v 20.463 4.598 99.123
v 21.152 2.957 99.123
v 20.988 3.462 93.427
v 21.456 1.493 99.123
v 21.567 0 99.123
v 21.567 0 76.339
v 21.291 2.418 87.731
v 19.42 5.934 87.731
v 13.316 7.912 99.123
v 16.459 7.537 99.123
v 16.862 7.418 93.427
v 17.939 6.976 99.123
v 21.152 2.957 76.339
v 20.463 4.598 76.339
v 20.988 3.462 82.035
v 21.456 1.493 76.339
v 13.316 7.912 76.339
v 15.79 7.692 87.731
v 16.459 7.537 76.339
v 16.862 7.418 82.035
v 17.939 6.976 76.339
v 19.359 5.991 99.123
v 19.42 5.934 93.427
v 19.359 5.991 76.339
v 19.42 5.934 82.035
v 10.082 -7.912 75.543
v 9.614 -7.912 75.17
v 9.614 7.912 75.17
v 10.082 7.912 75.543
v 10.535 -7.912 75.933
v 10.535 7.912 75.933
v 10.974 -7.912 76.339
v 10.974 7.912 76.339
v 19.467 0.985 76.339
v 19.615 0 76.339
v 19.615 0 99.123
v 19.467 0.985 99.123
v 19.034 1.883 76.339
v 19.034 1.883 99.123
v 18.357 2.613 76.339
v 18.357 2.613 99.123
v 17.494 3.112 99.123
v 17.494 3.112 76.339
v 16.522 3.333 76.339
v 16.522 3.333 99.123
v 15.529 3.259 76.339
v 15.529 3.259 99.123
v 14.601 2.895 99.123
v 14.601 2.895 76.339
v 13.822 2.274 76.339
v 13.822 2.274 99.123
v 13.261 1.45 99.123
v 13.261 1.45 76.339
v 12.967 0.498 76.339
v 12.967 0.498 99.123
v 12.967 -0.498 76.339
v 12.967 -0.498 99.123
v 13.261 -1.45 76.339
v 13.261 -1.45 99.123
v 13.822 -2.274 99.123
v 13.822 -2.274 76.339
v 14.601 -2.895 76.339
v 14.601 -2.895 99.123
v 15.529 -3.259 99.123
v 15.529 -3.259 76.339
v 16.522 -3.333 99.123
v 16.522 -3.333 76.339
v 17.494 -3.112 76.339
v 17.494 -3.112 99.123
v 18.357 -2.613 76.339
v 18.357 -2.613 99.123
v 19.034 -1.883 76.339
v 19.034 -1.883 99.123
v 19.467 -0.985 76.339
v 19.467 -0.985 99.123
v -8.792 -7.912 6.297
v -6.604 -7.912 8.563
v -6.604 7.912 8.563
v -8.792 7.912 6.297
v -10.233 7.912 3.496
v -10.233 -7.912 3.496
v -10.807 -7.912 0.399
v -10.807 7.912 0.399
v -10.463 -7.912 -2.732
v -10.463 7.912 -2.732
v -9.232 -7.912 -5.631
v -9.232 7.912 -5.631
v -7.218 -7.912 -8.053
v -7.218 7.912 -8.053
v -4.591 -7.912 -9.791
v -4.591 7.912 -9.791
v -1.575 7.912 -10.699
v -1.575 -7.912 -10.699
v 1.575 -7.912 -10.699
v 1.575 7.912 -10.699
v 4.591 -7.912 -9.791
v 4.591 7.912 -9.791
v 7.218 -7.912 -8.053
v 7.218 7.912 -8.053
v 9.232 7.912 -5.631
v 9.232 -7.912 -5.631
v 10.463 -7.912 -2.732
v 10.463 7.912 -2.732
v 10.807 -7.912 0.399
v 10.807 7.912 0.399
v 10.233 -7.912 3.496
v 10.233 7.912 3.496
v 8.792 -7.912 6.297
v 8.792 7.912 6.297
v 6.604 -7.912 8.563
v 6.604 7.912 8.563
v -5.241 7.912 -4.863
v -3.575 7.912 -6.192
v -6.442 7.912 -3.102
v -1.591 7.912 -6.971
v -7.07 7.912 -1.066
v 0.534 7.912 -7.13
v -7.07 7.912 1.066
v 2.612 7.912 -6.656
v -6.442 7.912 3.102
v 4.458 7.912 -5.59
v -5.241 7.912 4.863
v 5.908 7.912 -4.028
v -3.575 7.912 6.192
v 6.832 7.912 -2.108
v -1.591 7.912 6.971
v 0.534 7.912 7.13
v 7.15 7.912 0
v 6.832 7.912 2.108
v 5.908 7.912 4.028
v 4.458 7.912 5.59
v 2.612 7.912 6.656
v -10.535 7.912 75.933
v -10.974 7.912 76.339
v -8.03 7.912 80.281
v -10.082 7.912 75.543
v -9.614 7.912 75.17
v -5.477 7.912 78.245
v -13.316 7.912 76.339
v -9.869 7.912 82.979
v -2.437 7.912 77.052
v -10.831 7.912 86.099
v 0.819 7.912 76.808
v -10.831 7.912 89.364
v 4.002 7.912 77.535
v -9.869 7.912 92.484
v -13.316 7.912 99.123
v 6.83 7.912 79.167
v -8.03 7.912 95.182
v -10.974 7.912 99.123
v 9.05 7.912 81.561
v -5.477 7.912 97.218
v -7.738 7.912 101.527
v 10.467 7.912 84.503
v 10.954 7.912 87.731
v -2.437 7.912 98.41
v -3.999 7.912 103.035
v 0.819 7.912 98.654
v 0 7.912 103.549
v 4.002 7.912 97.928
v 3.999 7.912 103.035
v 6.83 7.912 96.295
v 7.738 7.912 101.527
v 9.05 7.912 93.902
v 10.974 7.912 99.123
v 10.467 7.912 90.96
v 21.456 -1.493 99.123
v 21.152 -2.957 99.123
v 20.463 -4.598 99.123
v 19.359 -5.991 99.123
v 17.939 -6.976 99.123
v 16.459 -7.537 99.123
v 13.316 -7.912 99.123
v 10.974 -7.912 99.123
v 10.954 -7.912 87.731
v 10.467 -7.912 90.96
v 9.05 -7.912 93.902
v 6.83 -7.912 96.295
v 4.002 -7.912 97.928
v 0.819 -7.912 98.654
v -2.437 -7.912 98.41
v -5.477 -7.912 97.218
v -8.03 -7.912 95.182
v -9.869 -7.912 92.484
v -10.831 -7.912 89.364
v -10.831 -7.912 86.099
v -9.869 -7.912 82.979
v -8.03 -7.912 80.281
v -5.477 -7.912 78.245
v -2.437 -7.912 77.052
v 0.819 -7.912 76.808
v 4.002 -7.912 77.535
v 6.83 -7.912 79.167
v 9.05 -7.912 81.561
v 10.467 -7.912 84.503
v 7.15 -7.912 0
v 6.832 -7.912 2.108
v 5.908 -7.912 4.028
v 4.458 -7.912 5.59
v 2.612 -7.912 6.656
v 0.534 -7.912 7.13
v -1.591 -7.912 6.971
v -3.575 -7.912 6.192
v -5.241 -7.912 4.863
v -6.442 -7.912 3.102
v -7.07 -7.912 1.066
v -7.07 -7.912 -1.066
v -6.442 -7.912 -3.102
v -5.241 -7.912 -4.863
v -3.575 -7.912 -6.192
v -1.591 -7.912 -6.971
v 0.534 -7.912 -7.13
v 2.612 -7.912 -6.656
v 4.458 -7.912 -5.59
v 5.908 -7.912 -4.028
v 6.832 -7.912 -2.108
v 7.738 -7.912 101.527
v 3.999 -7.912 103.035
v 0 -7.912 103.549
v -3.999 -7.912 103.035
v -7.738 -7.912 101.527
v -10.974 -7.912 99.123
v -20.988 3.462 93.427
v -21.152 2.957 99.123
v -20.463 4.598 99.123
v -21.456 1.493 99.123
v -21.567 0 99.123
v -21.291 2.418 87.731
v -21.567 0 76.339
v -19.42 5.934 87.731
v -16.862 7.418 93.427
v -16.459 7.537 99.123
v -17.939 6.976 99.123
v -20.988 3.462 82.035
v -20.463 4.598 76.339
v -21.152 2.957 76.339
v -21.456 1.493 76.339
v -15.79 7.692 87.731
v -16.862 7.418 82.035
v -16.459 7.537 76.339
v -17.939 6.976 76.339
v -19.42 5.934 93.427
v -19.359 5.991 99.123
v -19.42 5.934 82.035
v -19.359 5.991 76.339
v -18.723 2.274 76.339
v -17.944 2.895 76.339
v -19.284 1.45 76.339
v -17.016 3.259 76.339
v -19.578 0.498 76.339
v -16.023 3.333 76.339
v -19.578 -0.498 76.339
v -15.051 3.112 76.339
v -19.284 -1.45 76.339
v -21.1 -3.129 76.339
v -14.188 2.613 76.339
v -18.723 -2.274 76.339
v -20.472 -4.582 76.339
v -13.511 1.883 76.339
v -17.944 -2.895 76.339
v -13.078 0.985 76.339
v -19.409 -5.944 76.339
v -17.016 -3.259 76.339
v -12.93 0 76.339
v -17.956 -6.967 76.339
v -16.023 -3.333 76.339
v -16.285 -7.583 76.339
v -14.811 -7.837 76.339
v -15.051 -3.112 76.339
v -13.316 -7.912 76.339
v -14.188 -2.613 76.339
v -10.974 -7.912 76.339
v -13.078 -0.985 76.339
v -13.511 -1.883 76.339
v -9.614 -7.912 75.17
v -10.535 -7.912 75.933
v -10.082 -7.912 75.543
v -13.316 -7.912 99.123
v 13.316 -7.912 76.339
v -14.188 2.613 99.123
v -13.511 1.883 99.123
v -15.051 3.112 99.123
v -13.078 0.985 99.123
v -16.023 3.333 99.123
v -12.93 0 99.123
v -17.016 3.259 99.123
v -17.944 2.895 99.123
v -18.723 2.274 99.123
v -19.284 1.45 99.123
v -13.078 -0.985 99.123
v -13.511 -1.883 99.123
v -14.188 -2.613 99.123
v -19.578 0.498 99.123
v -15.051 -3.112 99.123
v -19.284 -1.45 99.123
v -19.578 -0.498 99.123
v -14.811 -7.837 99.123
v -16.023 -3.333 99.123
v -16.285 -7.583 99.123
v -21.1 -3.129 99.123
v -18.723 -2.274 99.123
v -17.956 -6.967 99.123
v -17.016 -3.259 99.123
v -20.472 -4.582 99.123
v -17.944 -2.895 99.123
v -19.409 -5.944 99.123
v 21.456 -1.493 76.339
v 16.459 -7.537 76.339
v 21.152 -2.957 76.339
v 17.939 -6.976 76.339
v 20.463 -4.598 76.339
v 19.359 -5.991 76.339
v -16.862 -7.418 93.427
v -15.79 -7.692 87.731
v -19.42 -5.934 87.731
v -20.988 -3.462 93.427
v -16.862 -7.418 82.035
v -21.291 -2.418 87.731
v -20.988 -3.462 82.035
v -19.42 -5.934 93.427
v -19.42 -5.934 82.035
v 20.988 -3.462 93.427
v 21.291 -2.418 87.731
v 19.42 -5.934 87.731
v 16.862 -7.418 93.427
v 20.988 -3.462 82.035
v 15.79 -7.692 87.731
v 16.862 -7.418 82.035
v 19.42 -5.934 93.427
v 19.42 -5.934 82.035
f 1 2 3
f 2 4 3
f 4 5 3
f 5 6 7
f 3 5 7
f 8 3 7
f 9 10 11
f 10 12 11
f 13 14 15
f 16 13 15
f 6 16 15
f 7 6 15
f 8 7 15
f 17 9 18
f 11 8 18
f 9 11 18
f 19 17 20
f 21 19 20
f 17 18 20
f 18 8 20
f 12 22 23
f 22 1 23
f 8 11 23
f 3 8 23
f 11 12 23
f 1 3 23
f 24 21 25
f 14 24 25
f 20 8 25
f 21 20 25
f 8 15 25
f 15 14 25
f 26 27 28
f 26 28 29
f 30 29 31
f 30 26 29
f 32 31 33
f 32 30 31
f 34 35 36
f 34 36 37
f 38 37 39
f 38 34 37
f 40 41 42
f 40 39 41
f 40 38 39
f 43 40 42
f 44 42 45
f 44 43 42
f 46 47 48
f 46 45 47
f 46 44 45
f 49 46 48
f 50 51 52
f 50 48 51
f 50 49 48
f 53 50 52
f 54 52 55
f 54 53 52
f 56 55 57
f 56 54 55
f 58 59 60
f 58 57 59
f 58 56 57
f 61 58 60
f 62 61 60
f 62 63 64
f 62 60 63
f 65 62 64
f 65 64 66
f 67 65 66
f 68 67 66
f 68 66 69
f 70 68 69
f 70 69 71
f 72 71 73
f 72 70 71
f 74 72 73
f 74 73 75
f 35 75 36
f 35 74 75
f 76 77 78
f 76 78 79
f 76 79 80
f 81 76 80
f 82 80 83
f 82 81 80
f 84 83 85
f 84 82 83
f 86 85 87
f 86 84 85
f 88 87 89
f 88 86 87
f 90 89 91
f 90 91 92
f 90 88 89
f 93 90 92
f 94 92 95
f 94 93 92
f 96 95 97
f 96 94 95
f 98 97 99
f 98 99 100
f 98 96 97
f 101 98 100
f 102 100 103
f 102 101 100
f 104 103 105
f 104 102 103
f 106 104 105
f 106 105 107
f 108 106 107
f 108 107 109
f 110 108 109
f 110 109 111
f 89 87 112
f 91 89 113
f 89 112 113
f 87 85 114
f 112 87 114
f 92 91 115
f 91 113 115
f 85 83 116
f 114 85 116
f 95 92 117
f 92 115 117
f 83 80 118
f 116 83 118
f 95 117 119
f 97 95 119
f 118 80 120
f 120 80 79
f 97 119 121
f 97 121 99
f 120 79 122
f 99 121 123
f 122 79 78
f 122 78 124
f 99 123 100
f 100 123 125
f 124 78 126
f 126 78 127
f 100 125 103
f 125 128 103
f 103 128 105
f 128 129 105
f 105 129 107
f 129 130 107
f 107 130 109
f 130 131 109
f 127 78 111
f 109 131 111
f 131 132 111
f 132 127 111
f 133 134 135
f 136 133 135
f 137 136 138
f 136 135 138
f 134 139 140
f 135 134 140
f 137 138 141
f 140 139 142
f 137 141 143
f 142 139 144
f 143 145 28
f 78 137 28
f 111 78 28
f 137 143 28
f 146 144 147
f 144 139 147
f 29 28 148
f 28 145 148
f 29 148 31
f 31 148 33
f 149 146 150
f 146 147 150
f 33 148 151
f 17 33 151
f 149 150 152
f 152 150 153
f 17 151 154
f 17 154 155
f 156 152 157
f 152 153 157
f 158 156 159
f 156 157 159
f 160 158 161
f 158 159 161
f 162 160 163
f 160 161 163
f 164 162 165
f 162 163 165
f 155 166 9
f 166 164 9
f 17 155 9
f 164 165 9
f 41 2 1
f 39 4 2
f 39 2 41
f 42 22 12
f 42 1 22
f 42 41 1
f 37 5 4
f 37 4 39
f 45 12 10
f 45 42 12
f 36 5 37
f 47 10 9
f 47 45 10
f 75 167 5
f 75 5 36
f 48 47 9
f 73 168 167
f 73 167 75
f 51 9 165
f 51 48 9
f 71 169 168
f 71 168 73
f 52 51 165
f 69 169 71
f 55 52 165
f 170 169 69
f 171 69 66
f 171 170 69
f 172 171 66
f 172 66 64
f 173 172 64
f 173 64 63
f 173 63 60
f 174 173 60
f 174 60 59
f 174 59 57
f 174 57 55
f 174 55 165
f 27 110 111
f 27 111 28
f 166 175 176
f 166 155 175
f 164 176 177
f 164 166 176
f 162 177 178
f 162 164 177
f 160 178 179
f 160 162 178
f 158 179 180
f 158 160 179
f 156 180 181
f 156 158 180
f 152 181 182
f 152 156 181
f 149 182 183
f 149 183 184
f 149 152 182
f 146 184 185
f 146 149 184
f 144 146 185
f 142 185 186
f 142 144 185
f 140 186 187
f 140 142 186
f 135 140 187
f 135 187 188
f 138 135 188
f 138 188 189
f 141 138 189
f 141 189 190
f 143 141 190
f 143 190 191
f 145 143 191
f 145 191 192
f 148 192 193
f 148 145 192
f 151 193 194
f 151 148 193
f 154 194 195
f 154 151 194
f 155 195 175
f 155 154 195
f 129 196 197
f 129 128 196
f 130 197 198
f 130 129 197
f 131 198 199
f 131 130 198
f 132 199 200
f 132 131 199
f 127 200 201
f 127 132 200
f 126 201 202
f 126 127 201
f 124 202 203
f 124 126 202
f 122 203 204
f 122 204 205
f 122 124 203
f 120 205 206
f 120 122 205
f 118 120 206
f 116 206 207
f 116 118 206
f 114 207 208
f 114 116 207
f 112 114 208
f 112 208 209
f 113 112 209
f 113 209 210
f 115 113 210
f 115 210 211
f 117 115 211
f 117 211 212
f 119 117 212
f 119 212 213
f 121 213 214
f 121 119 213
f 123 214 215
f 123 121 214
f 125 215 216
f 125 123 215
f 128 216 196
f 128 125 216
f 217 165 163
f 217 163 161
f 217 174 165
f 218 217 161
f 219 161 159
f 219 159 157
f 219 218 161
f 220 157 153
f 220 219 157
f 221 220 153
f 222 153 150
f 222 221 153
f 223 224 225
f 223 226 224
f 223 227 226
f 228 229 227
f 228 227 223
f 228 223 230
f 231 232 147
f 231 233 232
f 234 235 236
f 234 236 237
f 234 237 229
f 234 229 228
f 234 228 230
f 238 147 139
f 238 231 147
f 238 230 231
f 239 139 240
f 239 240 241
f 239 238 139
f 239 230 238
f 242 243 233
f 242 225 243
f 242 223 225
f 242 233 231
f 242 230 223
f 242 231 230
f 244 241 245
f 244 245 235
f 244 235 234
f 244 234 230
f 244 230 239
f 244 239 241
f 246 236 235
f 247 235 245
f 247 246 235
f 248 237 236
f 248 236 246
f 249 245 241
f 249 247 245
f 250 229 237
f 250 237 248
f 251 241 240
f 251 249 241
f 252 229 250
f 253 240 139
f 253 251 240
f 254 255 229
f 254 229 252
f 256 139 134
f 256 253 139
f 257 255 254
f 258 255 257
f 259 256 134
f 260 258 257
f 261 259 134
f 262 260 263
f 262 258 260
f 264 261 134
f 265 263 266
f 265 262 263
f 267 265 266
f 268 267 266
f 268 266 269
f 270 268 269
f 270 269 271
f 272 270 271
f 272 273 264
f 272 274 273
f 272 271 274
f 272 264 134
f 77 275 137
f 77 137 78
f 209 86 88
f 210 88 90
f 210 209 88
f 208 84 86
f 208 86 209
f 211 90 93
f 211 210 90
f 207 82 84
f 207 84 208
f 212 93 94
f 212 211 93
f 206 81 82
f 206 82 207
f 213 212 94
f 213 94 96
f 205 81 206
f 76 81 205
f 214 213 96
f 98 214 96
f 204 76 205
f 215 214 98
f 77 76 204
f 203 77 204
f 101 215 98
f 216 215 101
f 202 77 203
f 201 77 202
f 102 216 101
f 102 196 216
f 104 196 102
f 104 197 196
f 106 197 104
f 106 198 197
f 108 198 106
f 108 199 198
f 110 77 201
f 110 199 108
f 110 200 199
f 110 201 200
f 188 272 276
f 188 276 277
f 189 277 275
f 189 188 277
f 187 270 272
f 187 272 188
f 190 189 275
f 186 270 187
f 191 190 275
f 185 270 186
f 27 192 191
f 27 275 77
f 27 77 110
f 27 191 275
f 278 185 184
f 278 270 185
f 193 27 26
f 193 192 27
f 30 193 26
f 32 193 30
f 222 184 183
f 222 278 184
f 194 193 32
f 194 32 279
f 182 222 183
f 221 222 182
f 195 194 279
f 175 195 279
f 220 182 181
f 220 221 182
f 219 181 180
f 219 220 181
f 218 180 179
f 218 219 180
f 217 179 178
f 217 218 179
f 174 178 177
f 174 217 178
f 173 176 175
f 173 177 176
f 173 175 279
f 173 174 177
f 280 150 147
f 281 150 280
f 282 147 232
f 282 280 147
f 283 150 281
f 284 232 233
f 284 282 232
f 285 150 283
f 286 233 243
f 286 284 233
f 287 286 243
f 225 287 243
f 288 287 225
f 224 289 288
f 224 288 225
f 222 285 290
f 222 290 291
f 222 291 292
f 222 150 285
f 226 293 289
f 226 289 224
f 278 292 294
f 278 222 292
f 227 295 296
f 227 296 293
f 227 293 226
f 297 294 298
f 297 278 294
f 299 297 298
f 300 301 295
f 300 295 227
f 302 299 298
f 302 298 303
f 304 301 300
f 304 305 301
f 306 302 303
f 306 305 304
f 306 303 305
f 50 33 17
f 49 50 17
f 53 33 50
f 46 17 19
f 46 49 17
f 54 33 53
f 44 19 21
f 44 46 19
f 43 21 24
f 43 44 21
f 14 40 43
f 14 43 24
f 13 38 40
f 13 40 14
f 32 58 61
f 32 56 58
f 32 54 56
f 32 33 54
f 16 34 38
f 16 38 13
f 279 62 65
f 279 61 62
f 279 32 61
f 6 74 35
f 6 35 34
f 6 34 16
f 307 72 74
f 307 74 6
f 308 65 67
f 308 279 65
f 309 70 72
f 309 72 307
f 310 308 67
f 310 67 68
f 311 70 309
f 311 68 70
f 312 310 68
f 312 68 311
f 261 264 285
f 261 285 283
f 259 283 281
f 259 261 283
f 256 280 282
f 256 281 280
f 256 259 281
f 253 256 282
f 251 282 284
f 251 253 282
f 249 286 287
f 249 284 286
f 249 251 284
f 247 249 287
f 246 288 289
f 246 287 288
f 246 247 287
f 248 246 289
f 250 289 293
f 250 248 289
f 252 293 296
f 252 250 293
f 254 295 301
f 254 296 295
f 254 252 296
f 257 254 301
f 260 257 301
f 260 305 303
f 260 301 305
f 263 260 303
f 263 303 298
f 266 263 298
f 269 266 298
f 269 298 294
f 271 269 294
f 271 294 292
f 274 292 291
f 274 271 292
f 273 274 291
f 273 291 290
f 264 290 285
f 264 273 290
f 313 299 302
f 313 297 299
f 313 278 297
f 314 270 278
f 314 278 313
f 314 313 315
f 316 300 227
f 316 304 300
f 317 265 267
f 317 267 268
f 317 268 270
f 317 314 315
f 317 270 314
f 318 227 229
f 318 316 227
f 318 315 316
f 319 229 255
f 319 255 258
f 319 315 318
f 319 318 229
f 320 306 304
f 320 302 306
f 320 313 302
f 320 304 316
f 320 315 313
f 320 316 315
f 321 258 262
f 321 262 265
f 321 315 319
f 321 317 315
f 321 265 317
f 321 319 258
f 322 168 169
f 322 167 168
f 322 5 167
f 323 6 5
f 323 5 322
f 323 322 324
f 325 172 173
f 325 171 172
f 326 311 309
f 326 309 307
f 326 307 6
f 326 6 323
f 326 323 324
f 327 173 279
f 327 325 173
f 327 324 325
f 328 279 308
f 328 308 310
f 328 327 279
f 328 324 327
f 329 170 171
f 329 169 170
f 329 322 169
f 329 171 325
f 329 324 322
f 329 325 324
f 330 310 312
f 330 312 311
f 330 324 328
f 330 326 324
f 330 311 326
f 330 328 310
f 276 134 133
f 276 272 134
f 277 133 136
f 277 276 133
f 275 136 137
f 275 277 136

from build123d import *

# Parameters (mm, degrees)
F0_R        = 7.1501
F0_R_2      = 10.95375
F1_DEPTH    = 7.9121
F2_T1_DEPTH = 64.0588
F3_R        = 3.34264
F4_DEPTH    = 103.5501653159


# Not quite as in the source:
# - a fillet or chamfer that OpenCascade refuses, or shapes differently, is made with other operations: its cross-section is extruded or revolved along the edge and cut away or added
# - a feature names something its author has since deleted; it is built from what else it names


with BuildPart() as f1:
    # F0 (on Front) → F1 (new body, symmetric)
    with BuildSketch(Plane.XZ):
        with BuildLine():
            ThreePointArc((-10.9740144438, 76.3394153159), (-10.3105393191, 75.7356011824), (-9.6139, 75.1703716645))
            Line((-9.6139, 75.1703716645), (-6.604, 8.5633440549))
            ThreePointArc((-6.604, 8.5633440549), (0, -10.81405), (6.604, 8.5633440549))
            Line((6.604, 8.5633440549), (9.6139, 75.1703716645))
            ThreePointArc((9.6139, 75.1703716645), (10.3105393191, 75.7356011824), (10.9740144438, 76.3394153159))
            Line((10.9740144438, 76.3394153159), (21.57095, 76.3394153159))
            Line((21.57095, 76.3394153159), (21.57095, 99.1232153159))
            Line((21.57095, 99.1232153159), (10.9740144438, 99.1232153159))
            ThreePointArc((10.9740144438, 99.1232153159), (0, 103.5491653159), (-10.9740144438, 99.1232153159))
            Line((-10.9740144438, 99.1232153159), (-21.57095, 99.1232153159))
            Line((-21.57095, 99.1232153159), (-21.57095, 76.3394153159))
            Line((-21.57095, 76.3394153159), (-10.9740144438, 76.3394153159))
        make_face()
        Circle(F0_R, mode=Mode.SUBTRACT)
        with Locations((0, 87.7313153159)):
            Circle(F0_R_2, mode=Mode.SUBTRACT)
    extrude(amount=F1_DEPTH, both=True)

    # F2: fillet of radius 8.255 on 4 edges, made by hand

    # F2_s2 → F2_t1 (cut)
    with BuildSketch(Plane.XY.offset(55.7019153159)):
        with BuildLine():
            add(Edge.make_bspline(
                [(-13.31595, -7.9121), (-21.57095, -7.9121), (-21.57095, 0.3429)],
                knots=[0, 0, 0, 1, 1, 1], degree=2, weights=[1, 1, 1]))
            Line((-21.57095, 0.3429), (-21.57095, -7.9121))
            Line((-21.57095, -7.9121), (-13.31595, -7.9121))
        make_face()
        with BuildLine():
            add(Edge.make_bspline(
                [(-21.57095, -0.3429), (-21.57095, 7.9121), (-13.31595, 7.9121)],
                knots=[0, 0, 0, 1, 1, 1], degree=2, weights=[1, 1, 1]))
            Line((-13.31595, 7.9121), (-21.57095, 7.9121))
            Line((-21.57095, 7.9121), (-21.57095, -0.3429))
        make_face()
        with BuildLine():
            add(Edge.make_bspline(
                [(21.57095, 0.3429), (21.57095, -7.9121), (13.31595, -7.9121)],
                knots=[0, 0, 0, 1, 1, 1], degree=2, weights=[1, 1, 1]))
            Line((13.31595, -7.9121), (21.57095, -7.9121))
            Line((21.57095, -7.9121), (21.57095, 0.3429))
        make_face()
        with BuildLine():
            add(Edge.make_bspline(
                [(21.57095, -0.3429), (21.57095, 7.9121), (13.31595, 7.9121)],
                knots=[0, 0, 0, 1, 1, 1], degree=2, weights=[1, 1, 1]))
            Line((13.31595, 7.9121), (21.57095, 7.9121))
            Line((21.57095, 7.9121), (21.57095, -0.3429))
        make_face()
    extrude(amount=F2_T1_DEPTH, mode=Mode.SUBTRACT)

    # F3 (on Top) → F4 (cut, through all)
    with BuildSketch(Plane.XY):
        with Locations((-16.2724846, 0)):
            Circle(F3_R)
        with Locations((16.2724877468, 0)):
            Circle(F3_R)
    extrude(amount=F4_DEPTH, mode=Mode.SUBTRACT)


solid = f1.part
